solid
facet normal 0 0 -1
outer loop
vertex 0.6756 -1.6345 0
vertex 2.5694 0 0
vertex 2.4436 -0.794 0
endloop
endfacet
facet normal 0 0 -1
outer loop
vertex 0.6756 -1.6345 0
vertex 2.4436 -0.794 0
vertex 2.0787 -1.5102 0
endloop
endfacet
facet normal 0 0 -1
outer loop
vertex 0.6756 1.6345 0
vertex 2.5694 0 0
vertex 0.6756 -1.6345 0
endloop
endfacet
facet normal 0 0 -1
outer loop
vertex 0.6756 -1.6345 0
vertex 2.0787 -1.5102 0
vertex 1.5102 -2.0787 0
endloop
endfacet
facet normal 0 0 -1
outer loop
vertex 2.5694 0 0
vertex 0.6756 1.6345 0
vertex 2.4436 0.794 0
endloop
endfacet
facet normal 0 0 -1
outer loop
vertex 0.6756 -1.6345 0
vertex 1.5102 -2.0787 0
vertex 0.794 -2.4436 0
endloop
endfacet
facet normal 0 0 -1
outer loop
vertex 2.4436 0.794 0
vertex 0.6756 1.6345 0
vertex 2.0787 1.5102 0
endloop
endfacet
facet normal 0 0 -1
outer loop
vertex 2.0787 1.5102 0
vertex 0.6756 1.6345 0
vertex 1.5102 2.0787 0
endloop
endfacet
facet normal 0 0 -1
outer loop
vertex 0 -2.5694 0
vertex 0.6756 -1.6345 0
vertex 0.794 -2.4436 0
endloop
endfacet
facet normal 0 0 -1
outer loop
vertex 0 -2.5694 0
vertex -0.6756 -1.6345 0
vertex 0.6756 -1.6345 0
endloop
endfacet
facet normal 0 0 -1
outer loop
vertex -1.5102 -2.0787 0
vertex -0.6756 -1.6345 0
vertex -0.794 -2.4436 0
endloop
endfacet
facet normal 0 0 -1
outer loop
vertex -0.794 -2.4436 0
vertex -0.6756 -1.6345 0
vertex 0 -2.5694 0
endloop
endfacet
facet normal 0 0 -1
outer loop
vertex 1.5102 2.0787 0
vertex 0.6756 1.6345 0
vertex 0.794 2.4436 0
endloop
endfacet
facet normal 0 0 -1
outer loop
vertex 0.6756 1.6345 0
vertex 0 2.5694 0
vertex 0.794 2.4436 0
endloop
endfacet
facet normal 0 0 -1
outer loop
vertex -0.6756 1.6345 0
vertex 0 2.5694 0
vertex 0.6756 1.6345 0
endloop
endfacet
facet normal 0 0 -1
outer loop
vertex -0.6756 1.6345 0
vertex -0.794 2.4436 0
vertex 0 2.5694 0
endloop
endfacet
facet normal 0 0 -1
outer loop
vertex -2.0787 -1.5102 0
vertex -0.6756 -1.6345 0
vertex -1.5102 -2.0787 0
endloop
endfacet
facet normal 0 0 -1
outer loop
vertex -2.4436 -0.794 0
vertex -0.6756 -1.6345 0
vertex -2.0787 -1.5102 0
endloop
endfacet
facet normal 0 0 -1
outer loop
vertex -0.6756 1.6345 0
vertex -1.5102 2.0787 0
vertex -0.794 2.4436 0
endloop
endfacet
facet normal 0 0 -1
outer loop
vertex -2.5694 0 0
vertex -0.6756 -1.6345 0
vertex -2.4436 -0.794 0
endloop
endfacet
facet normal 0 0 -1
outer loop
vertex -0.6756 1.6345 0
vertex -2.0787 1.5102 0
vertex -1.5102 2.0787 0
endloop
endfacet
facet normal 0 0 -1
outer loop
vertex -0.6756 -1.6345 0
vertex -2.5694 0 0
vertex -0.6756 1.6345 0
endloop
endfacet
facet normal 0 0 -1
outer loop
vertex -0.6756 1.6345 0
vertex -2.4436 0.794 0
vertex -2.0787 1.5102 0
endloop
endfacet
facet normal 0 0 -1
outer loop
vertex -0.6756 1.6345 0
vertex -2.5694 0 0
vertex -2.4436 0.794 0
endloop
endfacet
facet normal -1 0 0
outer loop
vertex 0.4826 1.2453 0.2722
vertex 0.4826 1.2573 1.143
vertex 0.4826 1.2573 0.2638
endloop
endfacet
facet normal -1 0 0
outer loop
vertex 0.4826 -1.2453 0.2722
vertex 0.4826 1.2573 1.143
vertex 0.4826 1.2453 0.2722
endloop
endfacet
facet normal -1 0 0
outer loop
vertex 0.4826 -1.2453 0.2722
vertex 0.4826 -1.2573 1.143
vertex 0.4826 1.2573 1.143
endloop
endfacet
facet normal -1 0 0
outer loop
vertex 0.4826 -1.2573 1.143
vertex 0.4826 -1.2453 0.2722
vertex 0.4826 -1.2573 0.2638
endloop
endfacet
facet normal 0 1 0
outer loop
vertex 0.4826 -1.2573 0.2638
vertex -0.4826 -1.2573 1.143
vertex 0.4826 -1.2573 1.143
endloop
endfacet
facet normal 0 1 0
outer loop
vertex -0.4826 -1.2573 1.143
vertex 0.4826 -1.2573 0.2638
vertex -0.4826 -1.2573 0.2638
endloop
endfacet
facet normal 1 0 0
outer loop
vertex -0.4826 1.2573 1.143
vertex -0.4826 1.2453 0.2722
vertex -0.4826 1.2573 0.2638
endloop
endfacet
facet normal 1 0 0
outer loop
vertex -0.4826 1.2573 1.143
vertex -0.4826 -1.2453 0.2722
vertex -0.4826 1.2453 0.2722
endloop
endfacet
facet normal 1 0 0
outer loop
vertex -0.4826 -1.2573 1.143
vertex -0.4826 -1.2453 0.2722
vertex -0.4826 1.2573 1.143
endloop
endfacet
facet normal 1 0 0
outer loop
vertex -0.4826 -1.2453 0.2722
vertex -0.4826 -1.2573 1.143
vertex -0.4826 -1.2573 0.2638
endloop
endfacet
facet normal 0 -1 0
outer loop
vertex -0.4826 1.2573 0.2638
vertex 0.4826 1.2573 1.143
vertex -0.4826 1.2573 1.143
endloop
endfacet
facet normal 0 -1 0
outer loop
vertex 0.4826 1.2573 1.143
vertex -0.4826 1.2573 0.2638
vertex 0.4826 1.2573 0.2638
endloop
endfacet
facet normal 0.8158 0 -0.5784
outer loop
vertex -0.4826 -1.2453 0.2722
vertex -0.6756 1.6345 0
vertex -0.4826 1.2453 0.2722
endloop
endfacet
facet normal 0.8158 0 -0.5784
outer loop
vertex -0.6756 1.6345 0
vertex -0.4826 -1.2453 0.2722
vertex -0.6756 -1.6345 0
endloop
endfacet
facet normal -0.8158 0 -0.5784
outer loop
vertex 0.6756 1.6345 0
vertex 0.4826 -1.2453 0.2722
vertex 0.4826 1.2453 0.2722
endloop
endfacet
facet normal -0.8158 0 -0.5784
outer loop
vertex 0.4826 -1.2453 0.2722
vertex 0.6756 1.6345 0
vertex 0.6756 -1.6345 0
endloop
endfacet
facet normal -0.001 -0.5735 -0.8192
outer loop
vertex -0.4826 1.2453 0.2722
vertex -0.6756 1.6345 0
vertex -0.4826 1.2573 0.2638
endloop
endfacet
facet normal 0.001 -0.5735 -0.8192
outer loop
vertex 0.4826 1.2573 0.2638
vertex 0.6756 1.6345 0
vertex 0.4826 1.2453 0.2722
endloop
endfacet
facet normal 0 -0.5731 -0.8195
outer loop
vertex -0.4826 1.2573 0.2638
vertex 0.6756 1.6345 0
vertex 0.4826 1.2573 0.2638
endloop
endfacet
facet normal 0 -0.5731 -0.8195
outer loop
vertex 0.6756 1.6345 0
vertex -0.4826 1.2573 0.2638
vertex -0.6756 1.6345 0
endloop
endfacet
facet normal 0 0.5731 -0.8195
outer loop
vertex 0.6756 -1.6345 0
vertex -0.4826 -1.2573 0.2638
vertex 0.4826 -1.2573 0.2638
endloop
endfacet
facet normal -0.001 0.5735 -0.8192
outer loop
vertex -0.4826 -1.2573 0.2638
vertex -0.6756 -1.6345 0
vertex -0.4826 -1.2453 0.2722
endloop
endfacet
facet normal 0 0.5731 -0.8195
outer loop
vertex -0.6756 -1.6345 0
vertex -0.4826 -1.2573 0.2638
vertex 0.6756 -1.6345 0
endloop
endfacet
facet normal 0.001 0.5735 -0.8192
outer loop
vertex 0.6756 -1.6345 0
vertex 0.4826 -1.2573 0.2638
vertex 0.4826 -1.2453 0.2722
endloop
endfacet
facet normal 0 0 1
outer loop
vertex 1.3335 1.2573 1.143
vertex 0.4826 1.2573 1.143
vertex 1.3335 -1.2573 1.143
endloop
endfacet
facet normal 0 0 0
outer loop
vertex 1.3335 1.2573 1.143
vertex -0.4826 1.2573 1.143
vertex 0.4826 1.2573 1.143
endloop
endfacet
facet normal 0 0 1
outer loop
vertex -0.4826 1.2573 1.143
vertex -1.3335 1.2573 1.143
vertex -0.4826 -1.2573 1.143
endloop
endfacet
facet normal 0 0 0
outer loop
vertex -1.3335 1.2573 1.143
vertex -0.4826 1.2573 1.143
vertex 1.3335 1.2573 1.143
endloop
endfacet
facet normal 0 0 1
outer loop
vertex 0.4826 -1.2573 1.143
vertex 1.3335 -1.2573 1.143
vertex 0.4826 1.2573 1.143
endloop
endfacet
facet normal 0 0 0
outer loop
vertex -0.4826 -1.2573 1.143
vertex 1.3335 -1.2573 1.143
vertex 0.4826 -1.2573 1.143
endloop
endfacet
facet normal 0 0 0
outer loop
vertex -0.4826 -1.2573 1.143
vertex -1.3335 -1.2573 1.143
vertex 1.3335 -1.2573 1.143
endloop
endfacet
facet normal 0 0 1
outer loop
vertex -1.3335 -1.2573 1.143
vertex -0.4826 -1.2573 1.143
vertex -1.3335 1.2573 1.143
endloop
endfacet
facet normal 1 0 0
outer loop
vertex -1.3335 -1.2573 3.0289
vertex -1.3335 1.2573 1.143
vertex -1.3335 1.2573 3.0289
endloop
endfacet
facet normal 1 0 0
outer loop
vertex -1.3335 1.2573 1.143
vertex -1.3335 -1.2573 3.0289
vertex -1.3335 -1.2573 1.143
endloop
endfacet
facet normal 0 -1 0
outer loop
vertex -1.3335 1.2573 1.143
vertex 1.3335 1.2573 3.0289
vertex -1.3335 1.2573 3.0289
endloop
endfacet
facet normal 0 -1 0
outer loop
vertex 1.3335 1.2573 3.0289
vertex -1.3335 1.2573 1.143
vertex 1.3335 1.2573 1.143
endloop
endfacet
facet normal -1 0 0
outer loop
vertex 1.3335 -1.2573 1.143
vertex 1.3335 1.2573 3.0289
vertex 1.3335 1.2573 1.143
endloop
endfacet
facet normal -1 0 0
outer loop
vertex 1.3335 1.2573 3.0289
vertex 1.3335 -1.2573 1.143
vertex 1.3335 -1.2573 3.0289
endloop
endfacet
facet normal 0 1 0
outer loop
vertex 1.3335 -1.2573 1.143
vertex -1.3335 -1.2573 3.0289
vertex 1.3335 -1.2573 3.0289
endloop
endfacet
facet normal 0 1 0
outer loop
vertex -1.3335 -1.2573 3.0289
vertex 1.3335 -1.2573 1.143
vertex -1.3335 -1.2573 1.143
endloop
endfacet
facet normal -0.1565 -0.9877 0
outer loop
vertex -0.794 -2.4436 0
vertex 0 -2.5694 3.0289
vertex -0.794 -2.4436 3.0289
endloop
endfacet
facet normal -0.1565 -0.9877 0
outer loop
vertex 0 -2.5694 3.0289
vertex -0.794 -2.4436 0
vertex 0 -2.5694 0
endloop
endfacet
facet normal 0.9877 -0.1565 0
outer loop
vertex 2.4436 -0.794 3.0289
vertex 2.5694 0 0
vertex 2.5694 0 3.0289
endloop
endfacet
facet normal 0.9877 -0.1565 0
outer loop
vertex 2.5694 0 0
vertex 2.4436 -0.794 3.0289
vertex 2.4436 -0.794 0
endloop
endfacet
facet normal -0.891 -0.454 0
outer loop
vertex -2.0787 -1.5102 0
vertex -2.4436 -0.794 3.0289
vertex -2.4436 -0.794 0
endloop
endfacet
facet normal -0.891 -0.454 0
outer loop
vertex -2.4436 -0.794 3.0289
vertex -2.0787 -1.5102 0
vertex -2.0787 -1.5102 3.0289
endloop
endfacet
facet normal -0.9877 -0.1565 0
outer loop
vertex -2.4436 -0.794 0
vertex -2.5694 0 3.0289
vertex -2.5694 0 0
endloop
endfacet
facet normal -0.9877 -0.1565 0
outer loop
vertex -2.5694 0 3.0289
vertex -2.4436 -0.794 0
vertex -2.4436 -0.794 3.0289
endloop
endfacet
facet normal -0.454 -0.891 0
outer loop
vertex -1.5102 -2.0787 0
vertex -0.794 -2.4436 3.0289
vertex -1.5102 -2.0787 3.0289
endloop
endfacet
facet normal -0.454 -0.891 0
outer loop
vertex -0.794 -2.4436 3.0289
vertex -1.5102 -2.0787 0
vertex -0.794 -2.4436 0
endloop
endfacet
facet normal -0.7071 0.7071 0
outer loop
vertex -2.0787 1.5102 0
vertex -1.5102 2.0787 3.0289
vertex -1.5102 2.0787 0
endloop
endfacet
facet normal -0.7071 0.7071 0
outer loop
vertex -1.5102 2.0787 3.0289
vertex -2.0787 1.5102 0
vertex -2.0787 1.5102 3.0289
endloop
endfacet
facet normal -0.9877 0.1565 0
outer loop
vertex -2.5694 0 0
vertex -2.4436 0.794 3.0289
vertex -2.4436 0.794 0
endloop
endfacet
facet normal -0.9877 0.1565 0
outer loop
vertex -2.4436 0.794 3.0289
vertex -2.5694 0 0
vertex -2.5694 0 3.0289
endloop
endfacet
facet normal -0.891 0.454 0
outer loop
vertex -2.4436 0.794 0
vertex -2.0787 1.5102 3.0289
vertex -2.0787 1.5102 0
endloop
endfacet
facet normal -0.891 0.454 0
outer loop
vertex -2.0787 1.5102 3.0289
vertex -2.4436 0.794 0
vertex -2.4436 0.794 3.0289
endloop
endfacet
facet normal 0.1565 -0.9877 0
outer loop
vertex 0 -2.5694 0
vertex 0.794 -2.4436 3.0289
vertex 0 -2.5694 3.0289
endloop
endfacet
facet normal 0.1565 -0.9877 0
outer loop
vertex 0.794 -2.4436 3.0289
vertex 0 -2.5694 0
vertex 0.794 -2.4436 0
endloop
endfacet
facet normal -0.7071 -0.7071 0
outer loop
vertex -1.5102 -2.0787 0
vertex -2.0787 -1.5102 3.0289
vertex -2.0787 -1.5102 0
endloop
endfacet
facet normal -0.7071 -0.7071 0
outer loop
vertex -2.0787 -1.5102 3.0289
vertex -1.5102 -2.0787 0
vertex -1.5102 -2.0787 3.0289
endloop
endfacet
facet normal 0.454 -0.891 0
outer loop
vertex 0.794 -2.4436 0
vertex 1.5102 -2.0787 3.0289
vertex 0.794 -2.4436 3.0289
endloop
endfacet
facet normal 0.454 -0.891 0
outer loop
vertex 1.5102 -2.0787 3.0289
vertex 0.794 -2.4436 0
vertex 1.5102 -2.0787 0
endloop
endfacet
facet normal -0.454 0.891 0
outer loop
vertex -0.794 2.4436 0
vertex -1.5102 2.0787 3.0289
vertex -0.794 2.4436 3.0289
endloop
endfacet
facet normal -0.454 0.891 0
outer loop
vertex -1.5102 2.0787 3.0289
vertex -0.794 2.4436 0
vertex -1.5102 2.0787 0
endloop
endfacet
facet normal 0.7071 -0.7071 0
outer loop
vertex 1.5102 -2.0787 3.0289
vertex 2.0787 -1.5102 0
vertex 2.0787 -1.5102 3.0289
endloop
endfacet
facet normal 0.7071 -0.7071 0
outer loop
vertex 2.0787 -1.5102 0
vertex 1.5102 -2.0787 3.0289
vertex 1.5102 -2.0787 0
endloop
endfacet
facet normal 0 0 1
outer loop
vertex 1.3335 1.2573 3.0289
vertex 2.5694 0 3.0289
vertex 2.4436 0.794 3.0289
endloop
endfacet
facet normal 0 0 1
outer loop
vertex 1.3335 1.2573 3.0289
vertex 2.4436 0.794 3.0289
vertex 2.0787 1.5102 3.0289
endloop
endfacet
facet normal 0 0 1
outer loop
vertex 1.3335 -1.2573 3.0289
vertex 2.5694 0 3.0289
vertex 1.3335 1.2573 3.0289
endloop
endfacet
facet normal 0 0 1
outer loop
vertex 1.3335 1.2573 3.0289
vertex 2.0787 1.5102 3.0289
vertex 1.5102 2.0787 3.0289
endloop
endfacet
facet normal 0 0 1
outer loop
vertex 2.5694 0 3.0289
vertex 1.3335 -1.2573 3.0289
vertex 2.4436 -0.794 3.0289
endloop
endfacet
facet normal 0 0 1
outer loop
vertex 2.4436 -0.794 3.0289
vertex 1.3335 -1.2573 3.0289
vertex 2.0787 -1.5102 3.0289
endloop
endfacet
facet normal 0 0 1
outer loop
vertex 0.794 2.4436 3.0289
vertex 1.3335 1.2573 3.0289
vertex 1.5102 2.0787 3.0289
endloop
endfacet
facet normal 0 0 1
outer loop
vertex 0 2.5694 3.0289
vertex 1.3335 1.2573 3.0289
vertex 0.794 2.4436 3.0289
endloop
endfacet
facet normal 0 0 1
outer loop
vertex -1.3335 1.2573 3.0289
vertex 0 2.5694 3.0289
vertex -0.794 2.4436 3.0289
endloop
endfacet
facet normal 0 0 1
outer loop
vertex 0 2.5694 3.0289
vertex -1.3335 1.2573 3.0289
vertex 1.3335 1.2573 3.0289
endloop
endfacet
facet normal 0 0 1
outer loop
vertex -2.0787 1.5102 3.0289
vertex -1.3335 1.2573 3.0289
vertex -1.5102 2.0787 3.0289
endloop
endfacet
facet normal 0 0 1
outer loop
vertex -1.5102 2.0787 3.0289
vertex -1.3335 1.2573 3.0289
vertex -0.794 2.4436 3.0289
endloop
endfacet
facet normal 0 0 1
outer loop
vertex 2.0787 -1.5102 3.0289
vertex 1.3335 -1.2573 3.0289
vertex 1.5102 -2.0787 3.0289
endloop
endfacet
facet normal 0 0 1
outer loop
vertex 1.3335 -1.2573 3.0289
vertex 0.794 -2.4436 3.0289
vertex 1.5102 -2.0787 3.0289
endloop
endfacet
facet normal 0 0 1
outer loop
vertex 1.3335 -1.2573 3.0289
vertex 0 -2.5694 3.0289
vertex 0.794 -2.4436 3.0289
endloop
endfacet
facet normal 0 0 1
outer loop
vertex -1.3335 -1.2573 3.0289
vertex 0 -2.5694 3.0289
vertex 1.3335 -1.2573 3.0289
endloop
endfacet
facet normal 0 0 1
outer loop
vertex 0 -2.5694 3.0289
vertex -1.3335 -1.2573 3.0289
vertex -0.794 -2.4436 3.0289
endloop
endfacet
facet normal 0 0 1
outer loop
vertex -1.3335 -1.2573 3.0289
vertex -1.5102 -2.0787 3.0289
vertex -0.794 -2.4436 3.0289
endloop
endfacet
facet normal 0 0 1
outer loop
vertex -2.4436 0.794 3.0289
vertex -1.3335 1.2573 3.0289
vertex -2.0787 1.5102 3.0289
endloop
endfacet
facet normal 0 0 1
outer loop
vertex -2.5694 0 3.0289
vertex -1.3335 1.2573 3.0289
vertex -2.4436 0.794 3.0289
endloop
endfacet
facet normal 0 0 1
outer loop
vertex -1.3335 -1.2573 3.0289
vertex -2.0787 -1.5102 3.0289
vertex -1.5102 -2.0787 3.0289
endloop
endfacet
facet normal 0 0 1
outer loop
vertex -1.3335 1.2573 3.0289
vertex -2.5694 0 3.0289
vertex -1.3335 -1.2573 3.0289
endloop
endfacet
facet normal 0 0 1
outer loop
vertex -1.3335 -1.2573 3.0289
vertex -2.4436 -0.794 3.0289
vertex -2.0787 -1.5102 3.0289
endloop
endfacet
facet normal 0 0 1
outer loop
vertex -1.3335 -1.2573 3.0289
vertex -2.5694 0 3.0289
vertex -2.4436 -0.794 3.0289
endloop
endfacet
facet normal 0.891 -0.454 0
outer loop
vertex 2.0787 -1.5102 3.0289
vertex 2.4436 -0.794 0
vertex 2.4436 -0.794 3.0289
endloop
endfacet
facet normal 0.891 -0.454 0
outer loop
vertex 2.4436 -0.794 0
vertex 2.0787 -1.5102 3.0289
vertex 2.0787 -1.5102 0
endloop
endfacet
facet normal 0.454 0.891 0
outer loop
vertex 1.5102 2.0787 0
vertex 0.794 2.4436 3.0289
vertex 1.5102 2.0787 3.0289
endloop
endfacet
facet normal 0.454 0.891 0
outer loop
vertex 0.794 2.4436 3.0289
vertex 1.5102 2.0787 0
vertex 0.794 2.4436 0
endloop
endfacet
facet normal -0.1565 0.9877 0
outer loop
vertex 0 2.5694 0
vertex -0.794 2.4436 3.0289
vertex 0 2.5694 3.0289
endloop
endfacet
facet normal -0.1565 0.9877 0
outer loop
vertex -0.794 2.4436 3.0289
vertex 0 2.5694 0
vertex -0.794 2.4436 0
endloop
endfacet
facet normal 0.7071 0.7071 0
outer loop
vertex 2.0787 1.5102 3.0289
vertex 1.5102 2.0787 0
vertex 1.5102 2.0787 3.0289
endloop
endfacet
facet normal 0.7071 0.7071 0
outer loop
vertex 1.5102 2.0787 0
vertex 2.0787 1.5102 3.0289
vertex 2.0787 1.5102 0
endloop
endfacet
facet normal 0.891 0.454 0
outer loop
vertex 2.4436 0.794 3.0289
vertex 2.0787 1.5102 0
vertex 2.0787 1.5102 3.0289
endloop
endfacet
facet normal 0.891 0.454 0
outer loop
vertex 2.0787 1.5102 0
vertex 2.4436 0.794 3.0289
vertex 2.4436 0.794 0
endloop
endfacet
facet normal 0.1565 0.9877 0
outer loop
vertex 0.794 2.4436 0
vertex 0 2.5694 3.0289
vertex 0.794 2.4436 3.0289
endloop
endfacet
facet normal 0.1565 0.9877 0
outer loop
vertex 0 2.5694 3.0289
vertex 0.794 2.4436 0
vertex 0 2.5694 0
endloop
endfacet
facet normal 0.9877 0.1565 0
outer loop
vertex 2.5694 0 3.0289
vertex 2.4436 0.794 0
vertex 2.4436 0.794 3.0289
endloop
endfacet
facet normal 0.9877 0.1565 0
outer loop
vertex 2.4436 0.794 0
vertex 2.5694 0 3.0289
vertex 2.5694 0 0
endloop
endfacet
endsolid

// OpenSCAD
//Adjust these to fit your magnets. Dimension is mm (25.4 is the conversion from inches)
magnetLength = 0.105*25.4;//how long it is axially
magnetWidth  = 0.099*25.4;//diameter

//Tweak pegWidth to fit on your stickboxes. This will need to be adjusted according to your printer.
// Note that the two different pegs fit differently.
pegWidth = 0.038*25.4;
pegHeight = 0.099*25.4;//0.085 was very hard to put on

//don't change these
magnetDiagonal = sqrt(magnetLength^2+magnetWidth^2);
magnetLengthScaled = magnetLength*1.05;//to make it not interfere when press-fitting

pegLength = 0.045*25.4;

dia = max(max(0.2*25.4, magnetDiagonal*1.4), magnetDiagonal+0.058*25.4);//
height = pegLength+0.75*magnetWidth;

difference() {
    linear_extrude(height) {
        circle(d=dia, $fn=20);
    }
    union() {
        linear_extrude(height*3) {
            square([pegWidth, pegHeight], center=true);
            square([pegWidth, magnetWidth], center=true);
        }
        linear_extrude(pegLength*.5, scale=[0.4, 0.5]) {
            square([pegWidth*1.4, pegHeight*1.3], center=true);
        }
        translate([0, 0, pegLength]) {
            linear_extrude(height) {
                square([magnetLength, magnetWidth], center=true);
            }
        }
        translate([0, 0, pegLength]) {
            linear_extrude(height) {
                //square([dia*1.1, 1], center=true);
            }
        }
    }
}
